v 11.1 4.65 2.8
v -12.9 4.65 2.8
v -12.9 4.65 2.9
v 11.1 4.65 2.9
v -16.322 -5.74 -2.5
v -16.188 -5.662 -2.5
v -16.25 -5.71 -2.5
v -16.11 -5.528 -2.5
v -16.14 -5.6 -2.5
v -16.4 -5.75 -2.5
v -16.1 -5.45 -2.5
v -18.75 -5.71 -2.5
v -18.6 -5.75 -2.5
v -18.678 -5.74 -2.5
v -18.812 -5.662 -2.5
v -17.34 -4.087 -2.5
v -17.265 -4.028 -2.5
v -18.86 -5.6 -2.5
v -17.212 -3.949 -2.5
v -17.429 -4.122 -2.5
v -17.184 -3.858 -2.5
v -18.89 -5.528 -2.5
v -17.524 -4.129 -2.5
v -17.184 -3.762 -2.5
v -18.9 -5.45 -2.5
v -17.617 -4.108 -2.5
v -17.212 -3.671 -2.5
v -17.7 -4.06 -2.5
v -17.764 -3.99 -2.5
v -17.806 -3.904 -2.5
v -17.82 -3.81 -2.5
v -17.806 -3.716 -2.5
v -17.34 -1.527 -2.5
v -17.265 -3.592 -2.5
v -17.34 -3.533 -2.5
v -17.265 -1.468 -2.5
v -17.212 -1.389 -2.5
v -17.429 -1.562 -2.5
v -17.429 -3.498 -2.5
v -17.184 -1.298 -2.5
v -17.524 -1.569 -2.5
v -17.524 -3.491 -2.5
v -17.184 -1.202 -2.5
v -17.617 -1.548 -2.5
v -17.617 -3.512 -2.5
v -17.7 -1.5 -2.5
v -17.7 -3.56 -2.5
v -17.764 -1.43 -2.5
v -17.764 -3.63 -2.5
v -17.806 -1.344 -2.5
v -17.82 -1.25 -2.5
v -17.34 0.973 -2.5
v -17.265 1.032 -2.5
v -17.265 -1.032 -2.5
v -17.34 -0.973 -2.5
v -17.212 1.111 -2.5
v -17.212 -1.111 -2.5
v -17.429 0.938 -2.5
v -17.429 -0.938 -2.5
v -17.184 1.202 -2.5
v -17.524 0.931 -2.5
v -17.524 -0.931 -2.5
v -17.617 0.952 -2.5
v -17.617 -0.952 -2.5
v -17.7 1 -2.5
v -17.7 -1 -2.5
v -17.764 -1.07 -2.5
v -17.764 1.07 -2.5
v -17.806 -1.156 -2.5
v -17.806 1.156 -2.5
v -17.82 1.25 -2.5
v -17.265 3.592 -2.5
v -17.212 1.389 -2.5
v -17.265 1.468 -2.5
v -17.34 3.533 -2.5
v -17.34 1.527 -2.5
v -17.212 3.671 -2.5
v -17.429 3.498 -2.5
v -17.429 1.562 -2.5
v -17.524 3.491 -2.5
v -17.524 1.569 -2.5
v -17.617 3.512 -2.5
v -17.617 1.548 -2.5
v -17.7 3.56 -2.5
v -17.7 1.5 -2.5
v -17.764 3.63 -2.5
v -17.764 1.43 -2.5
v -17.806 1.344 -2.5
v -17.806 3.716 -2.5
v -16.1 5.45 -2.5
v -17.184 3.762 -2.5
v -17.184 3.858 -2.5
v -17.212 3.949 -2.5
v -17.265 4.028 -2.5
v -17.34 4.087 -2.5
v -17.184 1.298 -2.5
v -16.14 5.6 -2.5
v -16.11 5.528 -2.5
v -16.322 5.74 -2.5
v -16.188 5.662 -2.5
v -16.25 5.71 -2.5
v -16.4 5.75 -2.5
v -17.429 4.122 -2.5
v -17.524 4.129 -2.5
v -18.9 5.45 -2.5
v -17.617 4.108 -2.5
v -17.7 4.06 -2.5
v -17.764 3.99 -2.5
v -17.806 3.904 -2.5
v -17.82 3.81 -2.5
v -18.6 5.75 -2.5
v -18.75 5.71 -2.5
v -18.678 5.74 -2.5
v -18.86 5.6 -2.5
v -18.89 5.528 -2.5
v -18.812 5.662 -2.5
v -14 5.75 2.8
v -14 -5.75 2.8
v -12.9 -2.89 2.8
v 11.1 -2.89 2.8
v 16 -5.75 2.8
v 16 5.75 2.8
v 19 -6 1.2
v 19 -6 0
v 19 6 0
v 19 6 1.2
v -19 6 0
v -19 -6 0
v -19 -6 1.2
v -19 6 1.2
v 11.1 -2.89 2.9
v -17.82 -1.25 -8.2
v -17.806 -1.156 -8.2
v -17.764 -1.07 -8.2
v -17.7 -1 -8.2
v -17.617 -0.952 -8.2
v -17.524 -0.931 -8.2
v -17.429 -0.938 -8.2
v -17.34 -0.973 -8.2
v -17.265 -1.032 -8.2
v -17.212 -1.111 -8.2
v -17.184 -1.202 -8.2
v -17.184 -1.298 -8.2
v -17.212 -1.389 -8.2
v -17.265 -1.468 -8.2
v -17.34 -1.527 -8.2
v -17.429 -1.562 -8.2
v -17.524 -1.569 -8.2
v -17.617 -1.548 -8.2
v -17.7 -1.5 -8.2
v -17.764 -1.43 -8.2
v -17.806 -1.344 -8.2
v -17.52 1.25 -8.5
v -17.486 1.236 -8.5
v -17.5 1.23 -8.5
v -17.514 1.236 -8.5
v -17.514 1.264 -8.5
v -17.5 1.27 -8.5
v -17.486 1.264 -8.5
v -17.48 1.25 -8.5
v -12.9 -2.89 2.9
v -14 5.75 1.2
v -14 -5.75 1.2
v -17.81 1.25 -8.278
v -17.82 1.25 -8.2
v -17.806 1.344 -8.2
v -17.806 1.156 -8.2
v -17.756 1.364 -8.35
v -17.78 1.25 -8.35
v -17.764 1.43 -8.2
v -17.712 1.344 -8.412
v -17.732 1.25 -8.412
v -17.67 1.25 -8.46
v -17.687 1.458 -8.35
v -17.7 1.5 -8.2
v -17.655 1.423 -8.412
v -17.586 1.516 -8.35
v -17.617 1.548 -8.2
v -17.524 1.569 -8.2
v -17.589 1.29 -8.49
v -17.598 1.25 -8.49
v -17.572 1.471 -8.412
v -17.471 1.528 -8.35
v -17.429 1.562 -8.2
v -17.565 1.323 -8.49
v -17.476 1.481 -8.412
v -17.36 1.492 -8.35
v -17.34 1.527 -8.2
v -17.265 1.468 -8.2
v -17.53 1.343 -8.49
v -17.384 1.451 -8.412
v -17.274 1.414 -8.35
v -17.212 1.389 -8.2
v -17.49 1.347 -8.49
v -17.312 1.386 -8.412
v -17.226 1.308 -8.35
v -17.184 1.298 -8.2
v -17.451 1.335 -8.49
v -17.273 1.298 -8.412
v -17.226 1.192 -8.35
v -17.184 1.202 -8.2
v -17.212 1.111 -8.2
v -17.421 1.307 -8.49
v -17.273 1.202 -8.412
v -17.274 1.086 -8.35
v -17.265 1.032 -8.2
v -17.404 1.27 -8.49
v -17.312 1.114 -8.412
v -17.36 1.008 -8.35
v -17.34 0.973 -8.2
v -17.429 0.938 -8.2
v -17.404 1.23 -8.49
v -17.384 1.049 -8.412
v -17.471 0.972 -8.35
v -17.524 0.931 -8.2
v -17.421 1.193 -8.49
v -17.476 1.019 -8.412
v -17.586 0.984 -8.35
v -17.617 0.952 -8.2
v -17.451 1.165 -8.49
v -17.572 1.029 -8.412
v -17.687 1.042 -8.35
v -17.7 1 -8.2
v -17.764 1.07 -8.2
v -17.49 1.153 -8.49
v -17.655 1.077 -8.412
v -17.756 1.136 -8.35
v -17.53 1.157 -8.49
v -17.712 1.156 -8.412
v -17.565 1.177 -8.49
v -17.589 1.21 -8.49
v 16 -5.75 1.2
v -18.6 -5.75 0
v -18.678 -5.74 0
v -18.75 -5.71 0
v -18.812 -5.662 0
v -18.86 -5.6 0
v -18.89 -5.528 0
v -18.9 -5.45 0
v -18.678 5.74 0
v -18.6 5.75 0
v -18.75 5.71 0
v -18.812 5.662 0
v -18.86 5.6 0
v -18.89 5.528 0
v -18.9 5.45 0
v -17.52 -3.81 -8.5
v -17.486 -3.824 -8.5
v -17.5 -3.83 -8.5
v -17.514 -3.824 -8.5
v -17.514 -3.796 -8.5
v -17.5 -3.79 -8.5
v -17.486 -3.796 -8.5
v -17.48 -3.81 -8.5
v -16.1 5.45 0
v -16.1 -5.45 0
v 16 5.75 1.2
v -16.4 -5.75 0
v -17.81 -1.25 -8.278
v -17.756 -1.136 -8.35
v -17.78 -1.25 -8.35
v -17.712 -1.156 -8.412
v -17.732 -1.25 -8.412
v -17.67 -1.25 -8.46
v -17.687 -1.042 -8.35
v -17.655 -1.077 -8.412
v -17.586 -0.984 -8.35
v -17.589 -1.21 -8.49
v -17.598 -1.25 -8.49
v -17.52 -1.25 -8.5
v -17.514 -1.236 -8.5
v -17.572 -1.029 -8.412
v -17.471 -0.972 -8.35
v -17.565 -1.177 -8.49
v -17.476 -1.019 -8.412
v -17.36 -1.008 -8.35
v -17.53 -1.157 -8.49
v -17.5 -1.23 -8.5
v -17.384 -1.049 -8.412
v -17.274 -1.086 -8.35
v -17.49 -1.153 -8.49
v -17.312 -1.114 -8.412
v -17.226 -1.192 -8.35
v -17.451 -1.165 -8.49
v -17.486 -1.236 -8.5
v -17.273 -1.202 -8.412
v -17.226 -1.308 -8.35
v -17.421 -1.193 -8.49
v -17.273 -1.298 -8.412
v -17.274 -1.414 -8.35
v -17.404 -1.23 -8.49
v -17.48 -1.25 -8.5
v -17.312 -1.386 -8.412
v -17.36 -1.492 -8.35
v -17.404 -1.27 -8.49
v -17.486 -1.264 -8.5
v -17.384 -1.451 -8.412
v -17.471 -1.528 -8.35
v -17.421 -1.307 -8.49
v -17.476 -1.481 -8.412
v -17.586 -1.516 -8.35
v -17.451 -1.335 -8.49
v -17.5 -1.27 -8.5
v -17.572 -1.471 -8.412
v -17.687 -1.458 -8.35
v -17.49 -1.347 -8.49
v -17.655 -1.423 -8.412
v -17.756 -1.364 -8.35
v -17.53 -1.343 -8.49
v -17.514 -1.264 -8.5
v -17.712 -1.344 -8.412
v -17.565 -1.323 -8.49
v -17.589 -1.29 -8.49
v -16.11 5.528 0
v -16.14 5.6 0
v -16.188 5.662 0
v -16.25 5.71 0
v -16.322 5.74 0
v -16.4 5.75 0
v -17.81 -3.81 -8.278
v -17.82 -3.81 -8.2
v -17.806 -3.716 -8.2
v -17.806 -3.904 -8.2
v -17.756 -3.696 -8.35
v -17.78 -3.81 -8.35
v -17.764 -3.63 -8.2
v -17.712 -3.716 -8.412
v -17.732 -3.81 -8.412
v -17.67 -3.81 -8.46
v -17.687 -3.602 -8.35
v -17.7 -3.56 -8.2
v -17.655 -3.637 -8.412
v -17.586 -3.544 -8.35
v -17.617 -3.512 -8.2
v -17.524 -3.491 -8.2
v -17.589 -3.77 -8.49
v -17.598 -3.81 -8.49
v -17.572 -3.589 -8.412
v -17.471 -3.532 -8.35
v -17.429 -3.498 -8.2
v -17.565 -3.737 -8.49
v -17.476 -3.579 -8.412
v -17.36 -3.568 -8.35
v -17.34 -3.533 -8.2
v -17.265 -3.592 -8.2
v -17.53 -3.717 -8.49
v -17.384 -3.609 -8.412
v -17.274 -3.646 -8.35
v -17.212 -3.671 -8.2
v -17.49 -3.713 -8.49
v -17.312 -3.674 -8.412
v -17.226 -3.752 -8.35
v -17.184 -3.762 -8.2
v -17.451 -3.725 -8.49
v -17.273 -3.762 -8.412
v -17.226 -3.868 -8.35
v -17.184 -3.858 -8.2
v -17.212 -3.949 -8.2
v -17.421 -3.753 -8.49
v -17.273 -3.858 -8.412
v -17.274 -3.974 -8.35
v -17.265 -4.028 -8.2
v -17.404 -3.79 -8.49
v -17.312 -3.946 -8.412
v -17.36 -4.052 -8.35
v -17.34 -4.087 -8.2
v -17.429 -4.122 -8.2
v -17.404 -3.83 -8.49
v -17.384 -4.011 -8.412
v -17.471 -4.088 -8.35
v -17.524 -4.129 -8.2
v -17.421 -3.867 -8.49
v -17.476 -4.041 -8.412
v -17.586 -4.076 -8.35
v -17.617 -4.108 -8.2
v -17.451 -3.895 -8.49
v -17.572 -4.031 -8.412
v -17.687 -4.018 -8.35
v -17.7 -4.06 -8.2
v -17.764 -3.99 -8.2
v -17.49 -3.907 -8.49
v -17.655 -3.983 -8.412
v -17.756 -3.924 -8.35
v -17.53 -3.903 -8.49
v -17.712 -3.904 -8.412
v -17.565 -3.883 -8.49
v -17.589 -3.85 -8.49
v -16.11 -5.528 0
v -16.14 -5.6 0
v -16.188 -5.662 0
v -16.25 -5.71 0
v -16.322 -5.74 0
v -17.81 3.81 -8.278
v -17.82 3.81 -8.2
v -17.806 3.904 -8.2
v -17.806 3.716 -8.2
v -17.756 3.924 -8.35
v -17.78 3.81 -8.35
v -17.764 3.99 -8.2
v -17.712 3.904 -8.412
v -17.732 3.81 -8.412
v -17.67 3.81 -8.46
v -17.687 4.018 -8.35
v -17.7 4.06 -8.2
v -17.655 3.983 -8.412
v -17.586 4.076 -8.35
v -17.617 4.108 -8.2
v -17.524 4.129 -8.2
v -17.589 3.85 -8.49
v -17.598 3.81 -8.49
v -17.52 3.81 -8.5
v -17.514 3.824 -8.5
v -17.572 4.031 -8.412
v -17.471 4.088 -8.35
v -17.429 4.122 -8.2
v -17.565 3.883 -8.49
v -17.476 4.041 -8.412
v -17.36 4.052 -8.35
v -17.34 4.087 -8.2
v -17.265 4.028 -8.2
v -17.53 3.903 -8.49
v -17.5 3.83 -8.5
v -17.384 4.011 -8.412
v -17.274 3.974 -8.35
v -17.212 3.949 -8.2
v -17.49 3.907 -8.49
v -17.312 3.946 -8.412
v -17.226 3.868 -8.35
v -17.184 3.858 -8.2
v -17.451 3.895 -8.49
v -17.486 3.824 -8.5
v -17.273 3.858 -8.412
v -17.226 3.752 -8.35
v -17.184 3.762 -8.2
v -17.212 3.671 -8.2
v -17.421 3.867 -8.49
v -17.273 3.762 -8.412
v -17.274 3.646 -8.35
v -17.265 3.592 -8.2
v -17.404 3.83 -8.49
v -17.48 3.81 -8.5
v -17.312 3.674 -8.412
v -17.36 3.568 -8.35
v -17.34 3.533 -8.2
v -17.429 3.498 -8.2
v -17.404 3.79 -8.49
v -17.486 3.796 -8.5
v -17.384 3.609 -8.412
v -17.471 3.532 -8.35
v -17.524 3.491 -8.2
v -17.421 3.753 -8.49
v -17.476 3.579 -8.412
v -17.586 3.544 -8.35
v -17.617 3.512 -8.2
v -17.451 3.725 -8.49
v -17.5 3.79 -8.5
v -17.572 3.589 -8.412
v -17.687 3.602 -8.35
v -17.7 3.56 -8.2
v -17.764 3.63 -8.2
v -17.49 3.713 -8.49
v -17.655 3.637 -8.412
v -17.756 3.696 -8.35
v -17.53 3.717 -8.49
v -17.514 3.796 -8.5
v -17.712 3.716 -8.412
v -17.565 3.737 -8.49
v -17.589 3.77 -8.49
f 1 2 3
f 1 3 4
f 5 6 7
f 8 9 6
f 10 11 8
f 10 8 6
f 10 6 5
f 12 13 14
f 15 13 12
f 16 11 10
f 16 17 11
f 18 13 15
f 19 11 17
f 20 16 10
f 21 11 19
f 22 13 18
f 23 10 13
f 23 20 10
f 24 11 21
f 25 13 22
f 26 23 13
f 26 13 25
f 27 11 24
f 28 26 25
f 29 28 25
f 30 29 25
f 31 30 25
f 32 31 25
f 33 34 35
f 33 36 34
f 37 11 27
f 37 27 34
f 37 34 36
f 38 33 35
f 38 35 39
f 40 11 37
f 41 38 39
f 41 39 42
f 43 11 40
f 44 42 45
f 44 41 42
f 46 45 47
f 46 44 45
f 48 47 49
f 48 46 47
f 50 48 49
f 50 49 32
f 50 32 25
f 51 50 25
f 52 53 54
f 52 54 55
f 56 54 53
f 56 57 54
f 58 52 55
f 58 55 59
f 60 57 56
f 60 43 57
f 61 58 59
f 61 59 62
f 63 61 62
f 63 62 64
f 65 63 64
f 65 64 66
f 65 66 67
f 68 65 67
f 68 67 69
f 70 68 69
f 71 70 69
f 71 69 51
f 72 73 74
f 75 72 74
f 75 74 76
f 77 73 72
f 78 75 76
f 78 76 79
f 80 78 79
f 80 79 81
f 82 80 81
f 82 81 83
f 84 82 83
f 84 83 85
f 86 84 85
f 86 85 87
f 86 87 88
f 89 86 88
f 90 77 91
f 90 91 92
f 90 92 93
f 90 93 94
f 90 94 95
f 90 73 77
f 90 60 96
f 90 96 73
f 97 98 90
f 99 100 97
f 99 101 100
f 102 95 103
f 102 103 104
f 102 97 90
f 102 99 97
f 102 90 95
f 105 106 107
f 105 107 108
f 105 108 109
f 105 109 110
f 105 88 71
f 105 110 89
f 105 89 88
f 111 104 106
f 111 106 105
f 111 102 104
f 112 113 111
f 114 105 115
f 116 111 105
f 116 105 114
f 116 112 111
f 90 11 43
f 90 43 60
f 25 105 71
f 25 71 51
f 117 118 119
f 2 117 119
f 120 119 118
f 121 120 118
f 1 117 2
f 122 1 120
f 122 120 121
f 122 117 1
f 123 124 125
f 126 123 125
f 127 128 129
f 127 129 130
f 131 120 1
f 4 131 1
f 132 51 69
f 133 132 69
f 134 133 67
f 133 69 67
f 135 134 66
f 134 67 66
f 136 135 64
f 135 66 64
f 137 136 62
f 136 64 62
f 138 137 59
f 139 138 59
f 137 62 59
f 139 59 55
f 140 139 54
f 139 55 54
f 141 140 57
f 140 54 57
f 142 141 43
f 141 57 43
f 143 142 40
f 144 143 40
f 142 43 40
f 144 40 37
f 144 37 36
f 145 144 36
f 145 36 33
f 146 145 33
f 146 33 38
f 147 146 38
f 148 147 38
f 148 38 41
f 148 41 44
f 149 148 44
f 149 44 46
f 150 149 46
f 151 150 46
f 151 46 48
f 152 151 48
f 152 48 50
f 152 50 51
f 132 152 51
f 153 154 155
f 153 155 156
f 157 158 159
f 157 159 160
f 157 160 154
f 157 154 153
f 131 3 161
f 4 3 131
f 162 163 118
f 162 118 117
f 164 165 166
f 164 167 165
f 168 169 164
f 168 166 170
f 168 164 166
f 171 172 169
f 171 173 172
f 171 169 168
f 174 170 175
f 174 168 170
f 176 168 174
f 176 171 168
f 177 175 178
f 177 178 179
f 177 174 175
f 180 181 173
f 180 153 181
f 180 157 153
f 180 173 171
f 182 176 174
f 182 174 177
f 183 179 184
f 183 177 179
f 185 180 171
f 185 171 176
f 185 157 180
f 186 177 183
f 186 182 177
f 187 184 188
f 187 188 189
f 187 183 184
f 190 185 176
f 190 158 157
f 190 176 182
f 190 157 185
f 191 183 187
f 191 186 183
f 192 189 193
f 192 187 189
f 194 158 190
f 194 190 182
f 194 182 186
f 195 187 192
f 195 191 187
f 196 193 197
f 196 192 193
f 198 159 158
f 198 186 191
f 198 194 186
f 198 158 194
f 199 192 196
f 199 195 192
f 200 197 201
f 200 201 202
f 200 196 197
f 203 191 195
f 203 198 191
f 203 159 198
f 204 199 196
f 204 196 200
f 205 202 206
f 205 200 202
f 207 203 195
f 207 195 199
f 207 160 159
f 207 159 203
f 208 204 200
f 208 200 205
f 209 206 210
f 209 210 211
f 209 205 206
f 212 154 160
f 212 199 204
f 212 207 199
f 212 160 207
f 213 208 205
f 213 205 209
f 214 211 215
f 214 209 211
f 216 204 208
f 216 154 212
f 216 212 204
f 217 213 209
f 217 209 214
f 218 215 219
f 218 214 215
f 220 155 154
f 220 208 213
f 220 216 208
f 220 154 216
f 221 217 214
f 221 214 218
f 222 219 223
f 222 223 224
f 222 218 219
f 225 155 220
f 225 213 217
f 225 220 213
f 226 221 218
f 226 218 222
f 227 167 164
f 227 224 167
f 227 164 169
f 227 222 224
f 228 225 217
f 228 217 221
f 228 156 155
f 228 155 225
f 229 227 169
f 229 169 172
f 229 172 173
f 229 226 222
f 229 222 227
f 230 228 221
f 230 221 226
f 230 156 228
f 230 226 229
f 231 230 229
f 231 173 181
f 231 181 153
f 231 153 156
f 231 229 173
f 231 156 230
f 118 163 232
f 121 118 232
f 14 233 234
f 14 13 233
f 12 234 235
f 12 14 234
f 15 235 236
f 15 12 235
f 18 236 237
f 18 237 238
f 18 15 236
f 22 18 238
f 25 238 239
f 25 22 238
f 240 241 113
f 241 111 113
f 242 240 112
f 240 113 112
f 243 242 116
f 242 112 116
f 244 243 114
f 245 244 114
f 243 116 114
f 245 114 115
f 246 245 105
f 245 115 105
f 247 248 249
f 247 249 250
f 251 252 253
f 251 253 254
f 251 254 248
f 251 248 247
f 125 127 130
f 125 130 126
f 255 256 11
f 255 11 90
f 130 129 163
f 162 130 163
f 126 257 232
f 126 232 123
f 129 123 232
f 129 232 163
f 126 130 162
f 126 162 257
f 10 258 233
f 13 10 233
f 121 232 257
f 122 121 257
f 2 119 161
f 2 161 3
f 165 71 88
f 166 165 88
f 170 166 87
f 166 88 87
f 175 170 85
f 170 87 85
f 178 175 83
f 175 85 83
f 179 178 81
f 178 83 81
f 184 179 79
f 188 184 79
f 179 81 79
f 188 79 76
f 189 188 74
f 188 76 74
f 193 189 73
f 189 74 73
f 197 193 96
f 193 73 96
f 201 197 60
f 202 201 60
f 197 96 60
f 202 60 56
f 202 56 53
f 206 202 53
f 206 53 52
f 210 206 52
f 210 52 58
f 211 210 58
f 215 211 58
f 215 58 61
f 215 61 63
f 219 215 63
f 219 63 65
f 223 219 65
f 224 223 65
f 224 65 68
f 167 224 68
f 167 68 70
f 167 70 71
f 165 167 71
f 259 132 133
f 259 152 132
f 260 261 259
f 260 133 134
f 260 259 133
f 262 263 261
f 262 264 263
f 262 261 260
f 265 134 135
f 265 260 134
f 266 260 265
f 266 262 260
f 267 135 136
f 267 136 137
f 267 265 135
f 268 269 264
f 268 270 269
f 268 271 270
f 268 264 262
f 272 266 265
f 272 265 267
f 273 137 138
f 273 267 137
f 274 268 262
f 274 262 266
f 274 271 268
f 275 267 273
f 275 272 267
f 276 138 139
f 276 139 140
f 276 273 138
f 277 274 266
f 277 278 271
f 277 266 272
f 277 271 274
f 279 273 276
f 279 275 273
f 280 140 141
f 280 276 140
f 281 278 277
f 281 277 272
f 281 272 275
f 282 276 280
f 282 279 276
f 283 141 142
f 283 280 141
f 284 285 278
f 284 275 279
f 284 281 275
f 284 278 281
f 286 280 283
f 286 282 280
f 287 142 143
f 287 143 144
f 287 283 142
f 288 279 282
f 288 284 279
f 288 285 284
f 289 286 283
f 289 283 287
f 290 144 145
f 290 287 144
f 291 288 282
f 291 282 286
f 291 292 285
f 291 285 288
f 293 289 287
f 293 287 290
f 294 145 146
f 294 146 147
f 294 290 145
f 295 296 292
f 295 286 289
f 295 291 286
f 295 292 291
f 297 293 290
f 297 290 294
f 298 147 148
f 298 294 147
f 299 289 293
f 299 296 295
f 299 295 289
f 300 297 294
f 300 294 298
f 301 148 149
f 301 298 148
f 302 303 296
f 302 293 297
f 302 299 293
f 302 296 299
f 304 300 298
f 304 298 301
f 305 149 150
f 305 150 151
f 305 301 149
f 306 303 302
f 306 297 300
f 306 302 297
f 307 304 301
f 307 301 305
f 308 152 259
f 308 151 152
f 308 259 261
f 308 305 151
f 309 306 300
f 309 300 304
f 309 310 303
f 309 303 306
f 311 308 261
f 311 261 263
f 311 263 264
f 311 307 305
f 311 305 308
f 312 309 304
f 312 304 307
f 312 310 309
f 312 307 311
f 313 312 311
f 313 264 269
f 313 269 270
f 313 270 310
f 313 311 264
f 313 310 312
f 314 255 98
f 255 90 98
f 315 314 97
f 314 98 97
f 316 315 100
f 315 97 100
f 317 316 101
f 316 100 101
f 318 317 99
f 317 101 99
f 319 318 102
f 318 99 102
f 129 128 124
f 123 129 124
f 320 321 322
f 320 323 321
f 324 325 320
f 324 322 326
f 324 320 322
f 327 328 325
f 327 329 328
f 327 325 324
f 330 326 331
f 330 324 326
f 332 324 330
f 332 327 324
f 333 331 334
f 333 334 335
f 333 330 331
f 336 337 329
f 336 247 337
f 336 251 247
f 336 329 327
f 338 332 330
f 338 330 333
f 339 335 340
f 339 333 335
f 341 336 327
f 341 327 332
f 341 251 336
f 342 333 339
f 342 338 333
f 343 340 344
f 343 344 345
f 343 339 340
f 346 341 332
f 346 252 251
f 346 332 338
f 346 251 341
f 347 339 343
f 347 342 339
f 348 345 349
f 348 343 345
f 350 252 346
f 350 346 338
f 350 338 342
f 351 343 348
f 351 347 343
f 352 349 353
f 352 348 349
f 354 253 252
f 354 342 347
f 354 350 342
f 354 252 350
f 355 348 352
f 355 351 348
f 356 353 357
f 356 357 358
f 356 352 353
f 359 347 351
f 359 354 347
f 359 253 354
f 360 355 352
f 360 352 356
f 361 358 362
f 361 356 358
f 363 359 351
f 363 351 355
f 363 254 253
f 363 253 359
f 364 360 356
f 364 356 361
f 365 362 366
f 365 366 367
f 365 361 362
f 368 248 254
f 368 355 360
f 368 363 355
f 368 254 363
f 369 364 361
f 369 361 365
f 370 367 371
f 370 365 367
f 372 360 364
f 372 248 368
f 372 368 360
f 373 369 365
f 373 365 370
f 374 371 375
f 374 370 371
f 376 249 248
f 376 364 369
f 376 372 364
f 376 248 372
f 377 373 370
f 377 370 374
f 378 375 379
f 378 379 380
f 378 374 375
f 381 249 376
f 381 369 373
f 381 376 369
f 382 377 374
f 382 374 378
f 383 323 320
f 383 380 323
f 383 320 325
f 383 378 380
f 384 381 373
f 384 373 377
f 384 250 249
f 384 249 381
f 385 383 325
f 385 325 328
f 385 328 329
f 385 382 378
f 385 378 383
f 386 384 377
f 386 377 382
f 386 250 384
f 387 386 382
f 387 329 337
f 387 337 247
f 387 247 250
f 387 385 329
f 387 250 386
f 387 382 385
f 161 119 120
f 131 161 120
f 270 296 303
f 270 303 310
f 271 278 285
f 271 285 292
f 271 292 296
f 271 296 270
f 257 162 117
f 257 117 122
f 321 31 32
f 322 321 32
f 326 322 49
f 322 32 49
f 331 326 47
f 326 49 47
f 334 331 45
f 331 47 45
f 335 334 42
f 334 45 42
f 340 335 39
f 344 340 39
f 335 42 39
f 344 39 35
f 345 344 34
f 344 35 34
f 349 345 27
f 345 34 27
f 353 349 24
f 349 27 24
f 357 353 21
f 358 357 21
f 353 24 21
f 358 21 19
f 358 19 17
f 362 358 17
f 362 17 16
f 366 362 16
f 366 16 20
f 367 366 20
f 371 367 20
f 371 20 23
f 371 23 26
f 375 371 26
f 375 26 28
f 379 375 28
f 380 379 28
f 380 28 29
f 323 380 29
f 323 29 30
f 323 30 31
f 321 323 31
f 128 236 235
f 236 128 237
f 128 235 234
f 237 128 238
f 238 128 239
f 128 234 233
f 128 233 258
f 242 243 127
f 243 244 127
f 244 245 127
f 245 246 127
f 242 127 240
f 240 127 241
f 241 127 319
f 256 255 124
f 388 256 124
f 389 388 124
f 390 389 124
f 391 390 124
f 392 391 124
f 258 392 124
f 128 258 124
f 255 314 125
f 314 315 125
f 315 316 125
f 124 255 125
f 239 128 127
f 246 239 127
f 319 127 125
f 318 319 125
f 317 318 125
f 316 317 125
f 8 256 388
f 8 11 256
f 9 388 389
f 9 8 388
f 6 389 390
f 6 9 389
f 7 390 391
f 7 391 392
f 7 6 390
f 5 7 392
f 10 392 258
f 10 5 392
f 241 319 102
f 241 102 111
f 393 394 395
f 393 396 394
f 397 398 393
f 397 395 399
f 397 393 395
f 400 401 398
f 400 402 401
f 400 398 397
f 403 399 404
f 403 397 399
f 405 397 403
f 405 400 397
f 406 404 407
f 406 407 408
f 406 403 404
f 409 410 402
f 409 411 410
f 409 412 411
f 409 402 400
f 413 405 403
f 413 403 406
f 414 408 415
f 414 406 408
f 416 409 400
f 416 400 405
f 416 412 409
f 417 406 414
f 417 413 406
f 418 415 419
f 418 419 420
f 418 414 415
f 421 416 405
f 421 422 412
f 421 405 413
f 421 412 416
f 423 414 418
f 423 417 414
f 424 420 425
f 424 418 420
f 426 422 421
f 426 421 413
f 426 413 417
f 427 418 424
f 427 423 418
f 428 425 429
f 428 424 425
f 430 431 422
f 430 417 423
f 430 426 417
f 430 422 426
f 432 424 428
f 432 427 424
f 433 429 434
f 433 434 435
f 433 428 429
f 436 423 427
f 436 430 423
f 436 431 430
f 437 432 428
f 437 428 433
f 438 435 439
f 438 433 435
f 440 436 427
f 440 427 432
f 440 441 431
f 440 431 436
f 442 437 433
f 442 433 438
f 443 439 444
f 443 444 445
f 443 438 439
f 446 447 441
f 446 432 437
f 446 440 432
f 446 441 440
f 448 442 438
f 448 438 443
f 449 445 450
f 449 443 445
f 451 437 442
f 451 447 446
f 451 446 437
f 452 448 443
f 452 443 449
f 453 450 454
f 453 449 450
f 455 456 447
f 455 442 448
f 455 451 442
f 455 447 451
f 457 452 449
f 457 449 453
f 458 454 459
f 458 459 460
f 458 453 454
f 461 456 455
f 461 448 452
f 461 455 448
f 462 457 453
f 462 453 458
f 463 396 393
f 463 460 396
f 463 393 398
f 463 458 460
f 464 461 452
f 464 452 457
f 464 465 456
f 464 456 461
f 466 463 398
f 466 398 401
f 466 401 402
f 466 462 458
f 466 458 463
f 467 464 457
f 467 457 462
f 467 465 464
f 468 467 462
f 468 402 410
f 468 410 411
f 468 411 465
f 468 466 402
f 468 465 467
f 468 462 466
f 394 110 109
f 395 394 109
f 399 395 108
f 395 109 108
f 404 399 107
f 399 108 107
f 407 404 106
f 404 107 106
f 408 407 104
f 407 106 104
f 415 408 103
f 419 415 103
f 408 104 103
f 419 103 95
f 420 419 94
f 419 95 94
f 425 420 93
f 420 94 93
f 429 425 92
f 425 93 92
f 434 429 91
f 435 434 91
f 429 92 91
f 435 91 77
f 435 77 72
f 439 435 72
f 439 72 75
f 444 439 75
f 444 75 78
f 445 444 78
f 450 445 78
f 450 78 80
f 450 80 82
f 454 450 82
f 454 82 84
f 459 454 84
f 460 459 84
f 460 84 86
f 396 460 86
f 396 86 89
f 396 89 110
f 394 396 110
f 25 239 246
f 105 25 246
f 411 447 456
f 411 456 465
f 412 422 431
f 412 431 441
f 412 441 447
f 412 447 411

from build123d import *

# Parameters (mm, degrees)
SKETCH1_W           = 38
SKETCH1_H           = 12
BOSS_EXTRUDE1_DEPTH = 1.2
SKETCH2_W           = 30
SKETCH2_H           = 11.5
BOSS_EXTRUDE2_DEPTH = 1.6
SKETCH6_W           = 2.8
SKETCH6_H           = 11.5
BOSS_EXTRUDE4_DEPTH = 2.5
SKETCH5_R           = 0.32
BOSS_EXTRUDE5_DEPTH = 8.5
FILLET1_R           = 0.3
FILLET2_R           = 0.3
SKETCH4_W           = 24
SKETCH4_H           = 7.54
BOSS_EXTRUDE6_DEPTH = 0.1


with BuildPart() as part:
    # Sketch1 → Boss-Extrude1 (new body)
    with BuildSketch(Plane.XY):
        Rectangle(SKETCH1_W, SKETCH1_H)
    extrude(amount=BOSS_EXTRUDE1_DEPTH)

    # Sketch2 → Boss-Extrude2 (add)
    with BuildSketch(Plane.XY.offset(1.2)):
        with Locations((1, 0)):
            Rectangle(SKETCH2_W, SKETCH2_H)
    extrude(amount=BOSS_EXTRUDE2_DEPTH)

    # Sketch6 → Boss-Extrude4 (add)
    with BuildSketch(Plane(origin=(0, 0, 0), x_dir=(-1, 0, 0), z_dir=(0, 0, -1))):
        with Locations((17.5, 0)):
            Rectangle(SKETCH6_W, SKETCH6_H)
    extrude(amount=BOSS_EXTRUDE4_DEPTH)

    # Sketch5 → Boss-Extrude5 (add)
    with BuildSketch(Plane(origin=(0, 0, 0), x_dir=(-1, 0, 0), z_dir=(0, 0, -1))):
        with Locations((17.5, 3.81)):
            Circle(SKETCH5_R)
        with Locations((17.5, 1.25)):
            Circle(SKETCH5_R)
        with Locations((17.5, -1.25)):
            Circle(SKETCH5_R)
        with Locations((17.5, -3.81)):
            Circle(SKETCH5_R)
    extrude(amount=BOSS_EXTRUDE5_DEPTH)

    # Fillet1
    fillet1_edges = [part.edges().sort_by_distance(p)[0] for p in [
        (-17.18, 3.81, -8.5),
        (-17.18, 1.25, -8.5),
        (-17.18, -1.25, -8.5),
        (-17.18, -3.81, -8.5),
    ]]
    fillet(fillet1_edges, radius=FILLET1_R)

    # Fillet2
    fillet2_edges = [part.edges().sort_by_distance(p)[0] for p in [
        (-16.1, 5.75, -1.25),
        (-16.1, -5.75, -1.25),
        (-18.9, -5.75, -1.25),
        (-18.9, 5.75, -1.25),
    ]]
    fillet(fillet2_edges, radius=FILLET2_R)

    # Sketch4 → Boss-Extrude6 (add)
    with BuildSketch(Plane.XY.offset(2.8)):
        with Locations((-0.9, 0.88)):
            Rectangle(SKETCH4_W, SKETCH4_H)
    extrude(amount=BOSS_EXTRUDE6_DEPTH)


solid = part.part
